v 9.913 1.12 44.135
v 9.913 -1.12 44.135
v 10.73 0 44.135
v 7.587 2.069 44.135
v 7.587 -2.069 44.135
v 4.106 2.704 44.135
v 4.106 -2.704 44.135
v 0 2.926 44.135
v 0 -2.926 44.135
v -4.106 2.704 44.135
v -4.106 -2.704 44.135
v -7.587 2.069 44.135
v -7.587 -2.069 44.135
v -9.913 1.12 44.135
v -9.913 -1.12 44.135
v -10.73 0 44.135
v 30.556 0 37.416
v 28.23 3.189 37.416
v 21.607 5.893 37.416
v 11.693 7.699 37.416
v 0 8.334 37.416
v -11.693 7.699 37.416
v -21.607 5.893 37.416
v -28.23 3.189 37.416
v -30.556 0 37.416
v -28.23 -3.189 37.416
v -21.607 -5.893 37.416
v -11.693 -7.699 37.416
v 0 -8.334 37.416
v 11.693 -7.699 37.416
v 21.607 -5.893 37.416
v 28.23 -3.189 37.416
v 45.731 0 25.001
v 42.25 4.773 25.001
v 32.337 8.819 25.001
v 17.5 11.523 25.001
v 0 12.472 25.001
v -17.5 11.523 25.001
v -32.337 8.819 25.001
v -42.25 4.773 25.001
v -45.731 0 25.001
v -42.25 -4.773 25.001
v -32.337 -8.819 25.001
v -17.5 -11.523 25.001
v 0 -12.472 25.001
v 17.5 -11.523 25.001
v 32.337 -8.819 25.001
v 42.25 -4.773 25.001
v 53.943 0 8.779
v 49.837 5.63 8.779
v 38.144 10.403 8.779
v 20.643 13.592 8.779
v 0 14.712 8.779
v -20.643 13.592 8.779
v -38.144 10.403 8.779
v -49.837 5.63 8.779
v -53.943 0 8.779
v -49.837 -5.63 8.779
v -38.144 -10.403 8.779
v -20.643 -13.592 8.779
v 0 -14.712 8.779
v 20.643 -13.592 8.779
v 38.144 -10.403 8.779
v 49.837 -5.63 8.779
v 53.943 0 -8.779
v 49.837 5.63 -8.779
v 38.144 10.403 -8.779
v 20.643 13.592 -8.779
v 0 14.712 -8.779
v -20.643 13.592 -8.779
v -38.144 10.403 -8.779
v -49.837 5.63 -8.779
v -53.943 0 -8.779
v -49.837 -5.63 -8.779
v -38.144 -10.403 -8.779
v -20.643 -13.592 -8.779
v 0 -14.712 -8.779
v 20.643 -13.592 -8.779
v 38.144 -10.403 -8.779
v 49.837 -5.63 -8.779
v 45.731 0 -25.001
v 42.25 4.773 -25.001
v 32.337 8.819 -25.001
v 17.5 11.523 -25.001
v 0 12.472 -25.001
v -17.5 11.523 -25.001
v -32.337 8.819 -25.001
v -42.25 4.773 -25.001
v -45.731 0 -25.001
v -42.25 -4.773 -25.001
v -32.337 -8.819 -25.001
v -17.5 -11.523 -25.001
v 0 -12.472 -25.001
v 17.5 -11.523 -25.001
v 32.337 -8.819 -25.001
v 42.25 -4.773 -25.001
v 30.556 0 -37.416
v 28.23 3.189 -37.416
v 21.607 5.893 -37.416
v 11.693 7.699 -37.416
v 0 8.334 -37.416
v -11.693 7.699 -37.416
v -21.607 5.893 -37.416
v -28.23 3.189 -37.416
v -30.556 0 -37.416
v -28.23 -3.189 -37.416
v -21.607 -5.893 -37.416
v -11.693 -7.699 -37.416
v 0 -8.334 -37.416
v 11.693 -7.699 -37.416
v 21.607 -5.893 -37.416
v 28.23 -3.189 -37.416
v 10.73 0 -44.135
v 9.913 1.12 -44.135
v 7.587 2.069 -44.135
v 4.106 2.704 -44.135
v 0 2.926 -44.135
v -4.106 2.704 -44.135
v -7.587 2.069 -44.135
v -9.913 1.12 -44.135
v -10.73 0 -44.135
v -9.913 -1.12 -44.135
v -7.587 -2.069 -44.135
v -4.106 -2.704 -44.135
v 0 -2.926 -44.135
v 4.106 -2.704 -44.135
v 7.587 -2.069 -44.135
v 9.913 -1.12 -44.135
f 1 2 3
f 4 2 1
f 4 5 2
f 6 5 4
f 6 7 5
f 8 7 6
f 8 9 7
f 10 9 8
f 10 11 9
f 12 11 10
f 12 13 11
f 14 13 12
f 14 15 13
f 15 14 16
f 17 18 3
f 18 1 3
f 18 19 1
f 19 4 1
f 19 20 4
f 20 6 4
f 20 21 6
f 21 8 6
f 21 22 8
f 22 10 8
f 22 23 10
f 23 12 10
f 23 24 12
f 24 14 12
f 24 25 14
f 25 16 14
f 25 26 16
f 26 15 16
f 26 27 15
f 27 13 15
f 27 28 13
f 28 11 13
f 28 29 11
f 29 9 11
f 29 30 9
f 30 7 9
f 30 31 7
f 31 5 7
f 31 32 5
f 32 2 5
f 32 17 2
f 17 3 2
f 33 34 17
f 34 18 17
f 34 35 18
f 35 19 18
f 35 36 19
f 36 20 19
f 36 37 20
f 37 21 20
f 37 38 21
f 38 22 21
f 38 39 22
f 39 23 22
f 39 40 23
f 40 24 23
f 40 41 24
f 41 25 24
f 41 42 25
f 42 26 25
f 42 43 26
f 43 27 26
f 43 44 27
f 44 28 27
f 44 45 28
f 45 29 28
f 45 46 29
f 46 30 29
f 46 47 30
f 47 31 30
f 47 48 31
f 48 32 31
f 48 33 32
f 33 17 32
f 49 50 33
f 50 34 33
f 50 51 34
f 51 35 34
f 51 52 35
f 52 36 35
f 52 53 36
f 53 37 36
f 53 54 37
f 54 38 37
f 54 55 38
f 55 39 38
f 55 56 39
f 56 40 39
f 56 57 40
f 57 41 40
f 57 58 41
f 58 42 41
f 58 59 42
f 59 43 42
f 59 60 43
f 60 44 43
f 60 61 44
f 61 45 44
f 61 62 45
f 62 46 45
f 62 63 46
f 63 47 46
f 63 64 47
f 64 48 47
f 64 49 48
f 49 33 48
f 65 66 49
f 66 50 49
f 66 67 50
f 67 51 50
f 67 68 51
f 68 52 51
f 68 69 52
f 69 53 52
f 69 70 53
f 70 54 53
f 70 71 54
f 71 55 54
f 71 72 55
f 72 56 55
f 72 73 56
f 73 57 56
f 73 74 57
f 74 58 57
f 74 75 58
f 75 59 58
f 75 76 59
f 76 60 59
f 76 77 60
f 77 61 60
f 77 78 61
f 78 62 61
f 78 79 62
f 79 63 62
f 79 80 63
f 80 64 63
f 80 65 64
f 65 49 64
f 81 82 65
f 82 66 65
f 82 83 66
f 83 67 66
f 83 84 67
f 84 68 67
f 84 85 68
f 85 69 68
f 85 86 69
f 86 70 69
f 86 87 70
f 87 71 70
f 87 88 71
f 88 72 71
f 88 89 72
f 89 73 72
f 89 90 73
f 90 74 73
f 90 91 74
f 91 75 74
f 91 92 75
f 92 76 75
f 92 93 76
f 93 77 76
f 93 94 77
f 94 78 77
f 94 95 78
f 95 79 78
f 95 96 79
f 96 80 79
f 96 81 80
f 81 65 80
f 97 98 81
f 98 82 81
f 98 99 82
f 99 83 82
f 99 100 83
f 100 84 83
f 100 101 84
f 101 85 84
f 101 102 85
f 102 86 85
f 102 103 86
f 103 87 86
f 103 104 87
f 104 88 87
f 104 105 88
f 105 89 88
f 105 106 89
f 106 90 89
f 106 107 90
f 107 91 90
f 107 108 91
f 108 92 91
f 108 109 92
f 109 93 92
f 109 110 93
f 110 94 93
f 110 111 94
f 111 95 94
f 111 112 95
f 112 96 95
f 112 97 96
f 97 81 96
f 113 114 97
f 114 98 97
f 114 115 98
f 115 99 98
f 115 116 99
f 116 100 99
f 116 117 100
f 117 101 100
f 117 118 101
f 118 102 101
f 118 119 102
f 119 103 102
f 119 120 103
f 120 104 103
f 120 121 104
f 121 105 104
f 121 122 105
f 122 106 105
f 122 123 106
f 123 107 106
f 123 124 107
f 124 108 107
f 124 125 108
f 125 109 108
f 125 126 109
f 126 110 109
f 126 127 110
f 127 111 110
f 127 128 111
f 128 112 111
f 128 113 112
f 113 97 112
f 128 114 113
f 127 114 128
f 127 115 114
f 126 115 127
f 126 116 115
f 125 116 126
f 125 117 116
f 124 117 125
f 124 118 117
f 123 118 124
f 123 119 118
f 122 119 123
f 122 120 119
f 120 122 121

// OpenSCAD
// Generated by SolidPython 1.0.1 on 2020-07-29 00:46:49


scale(v = [11, 3, 9]) {
	sphere(r = 5);
}
/***********************************************
*********      SolidPython code:      **********
************************************************
 
# import packages: SolidPython
from solid import *
from solid.utils import *
from itertools import chain, combinations, permutations


class Resize:

    def __init__(self, scad_file):
        self.scad_file = scad_file
        #self.scad_file = import_scad(scad_file)
        # cone/cylinder param:
        self.r1 = 0
        self.r2 = 0
        self.h = 0
        # rectangular prism param:
        self.w = 0
        self.l = 0
        # ellipse param:
        self.r = 0

    # import OpenScad code (file name corresponds to shape)


    # classify shape + parameters
    def assign(self, param1, param2, param3):
        if self.scad_file == 'cone.scad':
            self.r1 = param1
            self.r2 = param2
            self.h = param3
        elif self.scad_file == 'cylinder.scad':
            self.r1 = param1
            self.r2 = param2
            self.h = param3
        elif self.scad_file == 'rectangularPrism.scad':
            self.h = param1
            self.l = param2
            self.w = param3
        else:
            self.r = param1
            self.h = param2

    # resize parameters
    def iterate(self):
        x = range(3, 20, 2)
        i = 1
        if self.scad_file == 'cone.scad':
            tempList = list(permutations(x, 2))
            for temp in tempList:
                param1 = temp[0]
                param2 = temp[1]
                filepath = 'produced_scad_files/' + 'cone' + str(param1) + '_' + str(param2) + '_' + '.scad'
                scad_render_to_file(cylinder(h=param1, r1=param2, r2=0), filepath)

        elif self.scad_file == 'cylinder.scad':
            tempList = list(permutations(x, 3))
            for temp in tempList:
                param1 = temp[0]
                param2 = temp[1]
                filepath = 'produced_scad_files/' + 'cylinder' + str(param1) + '_' + str(param2) + '_' + '.scad'
                scad_render_to_file(cylinder(h=param1, r1=param2, r2=param2), filepath)

        elif self.scad_file == 'rectangularPrism.scad':
            tempList = list(permutations(x, 3))
            for temp in tempList:
                param1 = temp[0]
                param2 = temp[1]
                param3 = temp[2]
                filepath = 'produced_scad_files/' + 'rectangularPrism' + str(param1) + '_' + str(param2) + '_' + str(
                    param3) + '.scad'
                scad_render_to_file(cube(size=(param1, param2, param3)), filepath)

        elif self.scad_file == 'ellipse.scad':
            tempList = list(permutations(x, 4))
            for temp in tempList:
                param1 = temp[0]
                param2 = temp[1]
                param3 = temp[2]
                param4 = temp[3]
                filepath = 'produced_scad_files/' + 'ellipse' + str(param1) + '_' + str(param2) + '_' + str(param3) + '_' + str(param4) + '.scad'
                scad_render_to_file(scale([param1, param2, param3])(sphere(r=param4)), filepath)

    def render_to_scadfile(self):
        scad_render_to_file(scad, 'example.scad') 
 
************************************************/
